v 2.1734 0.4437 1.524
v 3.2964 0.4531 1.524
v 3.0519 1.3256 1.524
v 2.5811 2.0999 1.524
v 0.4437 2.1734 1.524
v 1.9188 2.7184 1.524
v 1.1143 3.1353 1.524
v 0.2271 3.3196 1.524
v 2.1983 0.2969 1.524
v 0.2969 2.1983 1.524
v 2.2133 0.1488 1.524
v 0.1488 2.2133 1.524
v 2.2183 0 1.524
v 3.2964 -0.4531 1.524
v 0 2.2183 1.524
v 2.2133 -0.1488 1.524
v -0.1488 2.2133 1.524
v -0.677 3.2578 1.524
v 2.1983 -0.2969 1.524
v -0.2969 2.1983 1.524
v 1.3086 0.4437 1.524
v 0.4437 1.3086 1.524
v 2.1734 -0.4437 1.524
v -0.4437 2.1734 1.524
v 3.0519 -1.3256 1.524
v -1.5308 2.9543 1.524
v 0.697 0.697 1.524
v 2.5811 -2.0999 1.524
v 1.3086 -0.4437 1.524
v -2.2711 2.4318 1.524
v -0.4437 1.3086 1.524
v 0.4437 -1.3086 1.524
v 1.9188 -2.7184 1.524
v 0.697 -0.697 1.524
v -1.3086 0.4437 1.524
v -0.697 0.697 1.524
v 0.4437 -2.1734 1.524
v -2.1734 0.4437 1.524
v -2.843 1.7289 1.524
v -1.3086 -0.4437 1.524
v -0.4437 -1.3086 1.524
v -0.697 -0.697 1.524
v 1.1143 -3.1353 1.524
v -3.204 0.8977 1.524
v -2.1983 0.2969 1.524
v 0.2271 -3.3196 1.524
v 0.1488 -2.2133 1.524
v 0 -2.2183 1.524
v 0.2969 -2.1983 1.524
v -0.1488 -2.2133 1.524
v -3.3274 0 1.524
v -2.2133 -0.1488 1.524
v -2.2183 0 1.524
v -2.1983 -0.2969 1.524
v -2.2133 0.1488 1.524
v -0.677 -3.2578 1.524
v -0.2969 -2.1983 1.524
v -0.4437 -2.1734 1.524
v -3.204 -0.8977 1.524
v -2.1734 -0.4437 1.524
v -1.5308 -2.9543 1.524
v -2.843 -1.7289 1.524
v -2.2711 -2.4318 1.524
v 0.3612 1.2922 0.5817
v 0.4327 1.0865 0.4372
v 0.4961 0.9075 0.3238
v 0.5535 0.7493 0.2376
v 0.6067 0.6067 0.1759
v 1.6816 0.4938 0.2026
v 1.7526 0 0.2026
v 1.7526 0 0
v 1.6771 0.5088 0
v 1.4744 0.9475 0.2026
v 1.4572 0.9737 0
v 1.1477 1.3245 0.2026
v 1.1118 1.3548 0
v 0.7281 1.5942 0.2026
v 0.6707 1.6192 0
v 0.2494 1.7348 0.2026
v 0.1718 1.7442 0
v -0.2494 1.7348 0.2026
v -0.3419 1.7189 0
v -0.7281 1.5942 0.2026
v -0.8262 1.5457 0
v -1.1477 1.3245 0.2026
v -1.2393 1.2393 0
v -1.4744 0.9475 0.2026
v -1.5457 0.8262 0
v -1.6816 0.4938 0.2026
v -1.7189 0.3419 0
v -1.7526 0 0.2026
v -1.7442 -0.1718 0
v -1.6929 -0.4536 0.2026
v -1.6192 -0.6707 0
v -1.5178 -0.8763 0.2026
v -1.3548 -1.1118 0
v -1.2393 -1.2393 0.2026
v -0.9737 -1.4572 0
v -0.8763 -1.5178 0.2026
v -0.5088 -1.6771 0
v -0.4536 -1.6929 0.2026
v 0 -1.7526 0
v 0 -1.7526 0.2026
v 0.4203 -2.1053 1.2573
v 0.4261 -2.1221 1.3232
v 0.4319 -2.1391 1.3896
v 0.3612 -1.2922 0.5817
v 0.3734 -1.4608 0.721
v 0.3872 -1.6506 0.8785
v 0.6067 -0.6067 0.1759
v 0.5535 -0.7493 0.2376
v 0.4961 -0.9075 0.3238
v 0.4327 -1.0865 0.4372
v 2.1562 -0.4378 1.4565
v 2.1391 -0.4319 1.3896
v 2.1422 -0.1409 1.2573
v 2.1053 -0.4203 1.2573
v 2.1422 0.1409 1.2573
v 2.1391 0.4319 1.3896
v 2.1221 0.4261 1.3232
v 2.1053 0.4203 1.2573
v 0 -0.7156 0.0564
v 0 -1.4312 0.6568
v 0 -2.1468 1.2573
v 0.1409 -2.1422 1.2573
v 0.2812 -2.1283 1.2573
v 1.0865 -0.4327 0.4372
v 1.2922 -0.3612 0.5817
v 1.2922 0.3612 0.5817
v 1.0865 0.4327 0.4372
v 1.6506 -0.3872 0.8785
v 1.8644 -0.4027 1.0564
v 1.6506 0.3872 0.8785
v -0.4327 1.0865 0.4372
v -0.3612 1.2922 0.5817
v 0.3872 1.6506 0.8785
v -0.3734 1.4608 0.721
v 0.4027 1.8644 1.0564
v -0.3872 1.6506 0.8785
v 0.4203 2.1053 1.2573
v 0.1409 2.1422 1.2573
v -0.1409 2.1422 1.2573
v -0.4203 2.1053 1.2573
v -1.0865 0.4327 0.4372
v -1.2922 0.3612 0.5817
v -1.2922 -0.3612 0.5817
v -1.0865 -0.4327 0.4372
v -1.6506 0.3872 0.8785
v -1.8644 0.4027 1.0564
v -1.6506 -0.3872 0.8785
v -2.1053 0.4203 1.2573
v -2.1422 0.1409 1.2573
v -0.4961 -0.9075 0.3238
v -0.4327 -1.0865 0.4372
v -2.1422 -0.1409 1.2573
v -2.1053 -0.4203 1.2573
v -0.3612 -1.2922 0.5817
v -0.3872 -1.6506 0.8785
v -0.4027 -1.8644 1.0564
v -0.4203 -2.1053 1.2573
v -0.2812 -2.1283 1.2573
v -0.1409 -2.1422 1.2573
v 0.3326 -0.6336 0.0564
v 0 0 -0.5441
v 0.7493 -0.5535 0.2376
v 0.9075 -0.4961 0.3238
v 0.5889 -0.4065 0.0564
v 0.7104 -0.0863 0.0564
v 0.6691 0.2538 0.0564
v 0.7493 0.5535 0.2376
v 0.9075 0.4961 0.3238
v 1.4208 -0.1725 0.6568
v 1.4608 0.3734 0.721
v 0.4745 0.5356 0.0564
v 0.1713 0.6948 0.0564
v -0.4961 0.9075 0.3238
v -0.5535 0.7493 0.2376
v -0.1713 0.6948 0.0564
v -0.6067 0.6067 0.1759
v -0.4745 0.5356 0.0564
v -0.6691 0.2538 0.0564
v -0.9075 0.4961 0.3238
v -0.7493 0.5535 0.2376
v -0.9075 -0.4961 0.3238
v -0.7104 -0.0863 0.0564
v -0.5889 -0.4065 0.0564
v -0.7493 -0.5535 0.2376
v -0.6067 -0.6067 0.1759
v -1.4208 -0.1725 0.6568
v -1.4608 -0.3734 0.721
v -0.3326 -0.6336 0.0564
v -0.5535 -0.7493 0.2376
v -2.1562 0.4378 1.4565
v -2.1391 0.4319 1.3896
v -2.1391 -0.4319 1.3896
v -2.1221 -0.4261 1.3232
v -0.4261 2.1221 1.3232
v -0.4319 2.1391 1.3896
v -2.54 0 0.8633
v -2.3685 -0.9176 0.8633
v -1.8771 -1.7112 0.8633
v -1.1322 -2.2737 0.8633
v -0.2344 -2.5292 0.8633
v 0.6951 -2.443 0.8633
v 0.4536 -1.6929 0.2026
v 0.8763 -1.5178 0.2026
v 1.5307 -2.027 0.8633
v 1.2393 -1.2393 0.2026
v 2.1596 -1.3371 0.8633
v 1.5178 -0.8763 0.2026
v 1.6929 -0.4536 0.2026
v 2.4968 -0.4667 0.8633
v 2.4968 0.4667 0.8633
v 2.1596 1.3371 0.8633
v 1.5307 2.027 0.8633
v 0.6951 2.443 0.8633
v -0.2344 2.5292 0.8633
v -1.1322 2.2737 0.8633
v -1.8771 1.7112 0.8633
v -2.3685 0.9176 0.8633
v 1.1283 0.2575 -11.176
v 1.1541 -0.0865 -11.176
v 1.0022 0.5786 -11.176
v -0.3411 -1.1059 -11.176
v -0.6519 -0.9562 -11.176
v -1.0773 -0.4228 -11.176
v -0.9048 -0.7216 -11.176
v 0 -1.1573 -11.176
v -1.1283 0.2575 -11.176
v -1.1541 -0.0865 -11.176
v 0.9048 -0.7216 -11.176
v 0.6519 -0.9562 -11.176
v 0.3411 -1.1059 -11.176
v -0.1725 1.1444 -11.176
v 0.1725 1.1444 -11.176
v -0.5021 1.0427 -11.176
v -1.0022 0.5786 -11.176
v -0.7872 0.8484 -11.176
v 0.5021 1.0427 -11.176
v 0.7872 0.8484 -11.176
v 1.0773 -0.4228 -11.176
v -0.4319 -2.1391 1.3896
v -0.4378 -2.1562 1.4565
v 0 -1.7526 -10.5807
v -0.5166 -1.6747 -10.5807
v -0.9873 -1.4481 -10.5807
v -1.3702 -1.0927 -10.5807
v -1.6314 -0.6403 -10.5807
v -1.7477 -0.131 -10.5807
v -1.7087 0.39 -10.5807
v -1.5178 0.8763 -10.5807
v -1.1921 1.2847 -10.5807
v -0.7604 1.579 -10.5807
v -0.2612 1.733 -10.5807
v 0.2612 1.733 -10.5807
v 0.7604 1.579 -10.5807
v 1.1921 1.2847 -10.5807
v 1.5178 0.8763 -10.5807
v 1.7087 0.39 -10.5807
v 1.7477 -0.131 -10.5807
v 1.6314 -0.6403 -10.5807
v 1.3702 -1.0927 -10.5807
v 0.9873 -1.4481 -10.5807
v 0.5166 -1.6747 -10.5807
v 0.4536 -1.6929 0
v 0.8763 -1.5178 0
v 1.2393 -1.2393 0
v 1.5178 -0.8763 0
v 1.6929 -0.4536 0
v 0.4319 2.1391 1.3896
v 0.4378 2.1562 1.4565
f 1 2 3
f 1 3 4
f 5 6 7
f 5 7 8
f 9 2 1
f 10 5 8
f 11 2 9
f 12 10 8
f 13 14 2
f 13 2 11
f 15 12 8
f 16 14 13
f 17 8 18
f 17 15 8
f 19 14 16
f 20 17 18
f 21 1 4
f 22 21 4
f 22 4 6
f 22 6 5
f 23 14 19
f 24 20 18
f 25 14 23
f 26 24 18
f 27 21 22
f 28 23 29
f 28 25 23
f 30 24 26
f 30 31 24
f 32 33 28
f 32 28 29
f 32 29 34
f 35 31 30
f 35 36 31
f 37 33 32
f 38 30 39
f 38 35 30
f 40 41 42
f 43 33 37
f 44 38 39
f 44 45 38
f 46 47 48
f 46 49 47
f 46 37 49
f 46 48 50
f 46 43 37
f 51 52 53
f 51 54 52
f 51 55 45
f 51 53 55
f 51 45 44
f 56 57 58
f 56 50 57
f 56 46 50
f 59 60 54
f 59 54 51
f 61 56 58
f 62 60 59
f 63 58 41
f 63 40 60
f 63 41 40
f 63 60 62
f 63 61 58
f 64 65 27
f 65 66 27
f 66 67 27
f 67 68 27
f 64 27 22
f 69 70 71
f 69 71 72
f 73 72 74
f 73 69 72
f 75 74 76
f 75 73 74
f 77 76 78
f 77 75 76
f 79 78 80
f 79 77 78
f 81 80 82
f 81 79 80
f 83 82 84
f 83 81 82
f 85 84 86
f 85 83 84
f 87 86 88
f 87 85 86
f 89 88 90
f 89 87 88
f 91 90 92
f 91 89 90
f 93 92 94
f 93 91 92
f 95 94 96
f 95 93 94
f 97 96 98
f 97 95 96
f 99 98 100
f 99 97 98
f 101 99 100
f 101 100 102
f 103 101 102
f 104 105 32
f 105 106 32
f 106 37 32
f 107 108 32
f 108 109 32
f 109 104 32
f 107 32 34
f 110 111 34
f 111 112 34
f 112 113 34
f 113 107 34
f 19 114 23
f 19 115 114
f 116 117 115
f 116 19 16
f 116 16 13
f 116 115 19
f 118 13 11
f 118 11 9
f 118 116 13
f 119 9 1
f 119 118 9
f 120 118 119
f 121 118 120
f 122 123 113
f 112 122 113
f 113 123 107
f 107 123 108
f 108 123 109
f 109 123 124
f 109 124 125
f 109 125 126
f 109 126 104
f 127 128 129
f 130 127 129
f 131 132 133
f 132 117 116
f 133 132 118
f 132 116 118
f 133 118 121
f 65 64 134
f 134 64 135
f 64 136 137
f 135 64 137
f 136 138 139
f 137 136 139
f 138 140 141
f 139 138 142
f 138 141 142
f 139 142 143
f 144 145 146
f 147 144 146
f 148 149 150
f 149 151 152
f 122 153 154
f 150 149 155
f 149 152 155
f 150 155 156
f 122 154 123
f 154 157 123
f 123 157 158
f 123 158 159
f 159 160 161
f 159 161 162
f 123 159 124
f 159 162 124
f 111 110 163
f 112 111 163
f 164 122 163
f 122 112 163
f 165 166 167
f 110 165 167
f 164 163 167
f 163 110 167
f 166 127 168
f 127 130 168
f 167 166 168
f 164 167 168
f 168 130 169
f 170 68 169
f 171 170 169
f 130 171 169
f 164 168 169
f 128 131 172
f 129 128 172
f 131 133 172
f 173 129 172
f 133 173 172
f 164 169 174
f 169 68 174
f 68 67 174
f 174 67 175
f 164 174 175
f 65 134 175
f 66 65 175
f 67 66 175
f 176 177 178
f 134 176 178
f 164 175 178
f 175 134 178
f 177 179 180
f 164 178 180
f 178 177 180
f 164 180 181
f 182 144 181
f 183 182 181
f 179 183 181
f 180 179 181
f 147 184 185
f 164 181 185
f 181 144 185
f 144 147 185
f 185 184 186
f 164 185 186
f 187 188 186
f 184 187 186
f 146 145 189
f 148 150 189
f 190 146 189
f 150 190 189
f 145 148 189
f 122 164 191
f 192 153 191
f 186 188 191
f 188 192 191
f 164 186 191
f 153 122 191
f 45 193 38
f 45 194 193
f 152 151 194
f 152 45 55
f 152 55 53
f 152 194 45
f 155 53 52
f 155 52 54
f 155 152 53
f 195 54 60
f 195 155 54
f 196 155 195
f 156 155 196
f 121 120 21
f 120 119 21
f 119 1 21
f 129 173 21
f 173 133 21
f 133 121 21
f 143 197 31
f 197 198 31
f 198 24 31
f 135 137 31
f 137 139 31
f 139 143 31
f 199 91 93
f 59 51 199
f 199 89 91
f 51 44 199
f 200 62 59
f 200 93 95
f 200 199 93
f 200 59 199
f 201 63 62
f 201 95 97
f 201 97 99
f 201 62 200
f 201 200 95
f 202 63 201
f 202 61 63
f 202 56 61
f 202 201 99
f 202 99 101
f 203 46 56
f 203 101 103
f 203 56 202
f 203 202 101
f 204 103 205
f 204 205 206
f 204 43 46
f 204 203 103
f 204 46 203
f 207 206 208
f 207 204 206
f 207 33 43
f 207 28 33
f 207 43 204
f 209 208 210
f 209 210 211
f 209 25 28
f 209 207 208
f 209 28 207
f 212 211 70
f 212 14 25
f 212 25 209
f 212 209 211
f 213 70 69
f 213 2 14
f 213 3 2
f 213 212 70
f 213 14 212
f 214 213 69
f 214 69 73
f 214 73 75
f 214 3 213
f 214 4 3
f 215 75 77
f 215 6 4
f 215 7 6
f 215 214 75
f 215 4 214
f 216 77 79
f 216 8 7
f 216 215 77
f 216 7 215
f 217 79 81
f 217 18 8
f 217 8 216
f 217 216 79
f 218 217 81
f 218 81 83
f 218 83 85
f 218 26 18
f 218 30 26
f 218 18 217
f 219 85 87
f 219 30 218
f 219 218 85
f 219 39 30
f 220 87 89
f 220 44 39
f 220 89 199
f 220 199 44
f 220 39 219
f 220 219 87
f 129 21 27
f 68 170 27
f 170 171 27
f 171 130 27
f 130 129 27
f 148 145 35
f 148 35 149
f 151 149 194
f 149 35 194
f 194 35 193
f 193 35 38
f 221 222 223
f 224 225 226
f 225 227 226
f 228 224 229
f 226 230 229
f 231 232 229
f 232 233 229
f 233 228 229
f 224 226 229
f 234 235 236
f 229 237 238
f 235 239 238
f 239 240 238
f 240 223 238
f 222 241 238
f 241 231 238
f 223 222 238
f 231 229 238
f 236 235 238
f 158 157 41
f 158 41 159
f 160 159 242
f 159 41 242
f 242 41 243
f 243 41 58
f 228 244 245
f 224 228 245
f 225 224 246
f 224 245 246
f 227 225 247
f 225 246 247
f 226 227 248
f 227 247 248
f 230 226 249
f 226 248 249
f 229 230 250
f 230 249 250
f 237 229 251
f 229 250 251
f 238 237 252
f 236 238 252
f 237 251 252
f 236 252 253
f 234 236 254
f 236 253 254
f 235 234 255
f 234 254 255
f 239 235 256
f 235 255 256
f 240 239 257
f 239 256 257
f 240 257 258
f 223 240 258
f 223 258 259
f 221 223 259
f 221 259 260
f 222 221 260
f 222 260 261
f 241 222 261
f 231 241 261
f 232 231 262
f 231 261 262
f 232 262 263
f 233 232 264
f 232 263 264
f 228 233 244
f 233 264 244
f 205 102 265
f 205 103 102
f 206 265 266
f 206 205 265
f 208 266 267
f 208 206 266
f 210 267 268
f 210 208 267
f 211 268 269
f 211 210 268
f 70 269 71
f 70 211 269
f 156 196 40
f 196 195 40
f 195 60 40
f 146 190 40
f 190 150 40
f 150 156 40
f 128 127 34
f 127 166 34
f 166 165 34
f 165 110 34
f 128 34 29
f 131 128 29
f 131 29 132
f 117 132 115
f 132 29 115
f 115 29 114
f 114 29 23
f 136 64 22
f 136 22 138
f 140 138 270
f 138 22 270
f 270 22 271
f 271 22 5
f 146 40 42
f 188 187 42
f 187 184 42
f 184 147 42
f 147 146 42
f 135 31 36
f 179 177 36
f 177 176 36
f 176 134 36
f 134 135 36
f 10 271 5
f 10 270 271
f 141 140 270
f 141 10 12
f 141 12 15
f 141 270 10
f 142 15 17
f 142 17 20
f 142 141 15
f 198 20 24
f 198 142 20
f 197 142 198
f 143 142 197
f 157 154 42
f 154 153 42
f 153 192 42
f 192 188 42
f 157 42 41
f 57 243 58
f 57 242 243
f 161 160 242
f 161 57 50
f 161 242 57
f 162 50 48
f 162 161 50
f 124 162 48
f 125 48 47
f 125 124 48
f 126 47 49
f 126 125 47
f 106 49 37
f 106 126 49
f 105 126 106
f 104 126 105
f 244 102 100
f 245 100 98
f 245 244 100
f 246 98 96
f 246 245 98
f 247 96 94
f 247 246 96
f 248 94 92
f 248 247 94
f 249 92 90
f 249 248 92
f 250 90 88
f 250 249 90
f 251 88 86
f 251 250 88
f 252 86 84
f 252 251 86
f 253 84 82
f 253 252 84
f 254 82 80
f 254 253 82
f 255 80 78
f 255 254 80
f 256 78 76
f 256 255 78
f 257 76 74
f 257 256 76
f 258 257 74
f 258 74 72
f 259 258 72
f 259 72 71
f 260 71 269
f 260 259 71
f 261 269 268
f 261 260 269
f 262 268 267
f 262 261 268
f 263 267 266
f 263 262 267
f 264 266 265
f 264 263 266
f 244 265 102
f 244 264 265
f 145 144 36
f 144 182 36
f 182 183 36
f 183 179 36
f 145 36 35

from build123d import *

# Parameters (mm, degrees)
SKETCH1_R          = 3.3274
EXTRUDE3_DEPTH     = 1.524
SKETCH4_W          = 12.7
SKETCH4_H          = 1.7526
CHAMFER1_SIZE      = 0.5953125
SKETCH26_R         = 0.8763
EXTRUDE8_DEPTH     = 1.524
CUT_EXTRUDE3_REACH = 15.544
CIRPATTERN1_COUNT  = 4
DRAFT2_ANGLE       = 5


# Read off the part's stored shape, not the designer's step: Extrude10, Draft1
with BuildPart() as part:
    # Sketch1 → Extrude3 (new body)
    with BuildSketch(Plane.XY):
        with Locations(Location((0, 0, 0), (0, 0, 180))):
            Circle(SKETCH1_R)
    extrude(amount=EXTRUDE3_DEPTH)

    # Sketch11 → Cut-Revolve3 (revolve, cut)
    with BuildSketch(Plane(origin=(0, 0, 0), x_dir=(0, 0, -1), z_dir=(1, 0, 0)), mode=Mode.PRIVATE) as cut_revolve3_sk:
        Polygon((0, 1.511167525), (-1.524, 3.3274), (0, 3.3274), align=None)
    revolve(cut_revolve3_sk.sketch.rotate(Axis((0, 0, -0.441444004), (0, 0, 1)), 90), axis=Axis((0, 0, -0.441444004), (0, 0, 1)), mode=Mode.SUBTRACT)

    # Extrude10 outline → Extrude10 (revolve)
    with BuildSketch(Plane.XZ):
        Polygon((1.7526, 0), (1.7526, 0.202585901), (1.511167525, 0.202585901), (1.511167525, 0), (0, 0), (0, -1.7526), align=None)
    revolve(axis=Axis((0, 0, 0), (0, 0, 1)))



with BuildPart() as body_2:
    # Sketch4 → Revolve1 (revolve)
    with BuildSketch(Plane(origin=(0, 0, 0), x_dir=(0, 0, -1), z_dir=(1, 0, 0)), mode=Mode.PRIVATE) as revolve1_sk:
        with Locations((4.826, 0.8763)):
            Rectangle(SKETCH4_W, SKETCH4_H)
    revolve(revolve1_sk.sketch.rotate(Axis((0, 0, 1.524), (0, 0, -1)), 180), axis=Axis((0, 0, 1.524), (0, 0, -1)))

    # Chamfer1
    chamfer1_edges = [body_2.edges().sort_by_distance(p)[0] for p in [
        (0, 1.7526, -11.176),
    ]]
    chamfer(chamfer1_edges, length=CHAMFER1_SIZE)


with BuildPart() as part_1:
    add(part.part)

    add(body_2.part)  # Extrude8 merges body 2
    # Sketch26 → Extrude8 (add)
    with BuildSketch(Plane.XY.offset(1.524)):
        Circle(SKETCH26_R)
    extrude(amount=-EXTRUDE8_DEPTH)

    # Cut-Extrude3: up to this cone (the profile starts inside it)
    cut_extrude3_end = Plane(origin=(0, 0, 1.524), z_dir=(0, 0, 1)).offset(-2.068083744) * Cone(1.192e-06, 24.522394484, 20.576731167, align=(Align.CENTER, Align.CENTER, Align.MIN), mode=Mode.PRIVATE)
    # Sketch12 → Cut-Extrude3 (cut, up to the surface)
    with BuildSketch(Plane.XY.offset(1.524), mode=Mode.PRIVATE) as cut_extrude3_sk1:
        with BuildLine():
            Line((2.173448579, 0.443653333), (1.308550956, 0.443653333))
            Line((1.308550956, 0.443653333), (0.696975982, 0.696975982))
            Line((0.696975982, 0.696975982), (0.443653333, 1.308550956))
            Line((0.443653333, 1.308550956), (0.443653333, 2.173448579))
            ThreePointArc((0.443653333, 2.173448579), (0.22295568, 2.207033704), (0, 2.218266667))
            Line((0, 2.218266667), (0, 0))
            Line((0, 0), (2.218266667, 0))
            ThreePointArc((2.218266667, 0), (2.207033704, 0.22295568), (2.173448579, 0.443653333))
        make_face()
    cut_extrude3_tool1 = extrude(cut_extrude3_sk1.sketch, amount=-CUT_EXTRUDE3_REACH, mode=Mode.PRIVATE) & cut_extrude3_end
    cut_extrude3 = cut_extrude3_tool1.solids().sort_by_distance((1.741, 0.412282, 1.524))[0]
    add(cut_extrude3, mode=Mode.SUBTRACT)

    # CirPattern1: Cut-Extrude3 ×4 about axis
    cirpattern1_axis = Axis((0, 0, 0), (0, 0, 1))
    for i in range(1, CIRPATTERN1_COUNT):
        add(cut_extrude3.rotate(cirpattern1_axis, i * 360 / CIRPATTERN1_COUNT), mode=Mode.SUBTRACT)

    # Draft1 outline → Draft1 (revolve)
    with BuildSketch(Plane.XZ):
        Polygon((2.218266667, 1.524), (2.146804001, 1.257297702), (2.218266667, 1.257297702), align=None)
    revolve(axis=Axis((0, 0, 0), (0, 0, 1)))

    # Draft2
    draft2_faces = [part_1.faces().sort_by_distance(p)[0] for p in [
        (0.443653333, 1.642629798, 1.204938596),
        (0.576807254, 0.987088954, 0.973802508),
        (0.987088954, 0.576807254, 0.973802508),
        (1.642629798, 0.443653333, 1.204938596),
        (1.642629798, -0.443653333, 1.204938596),
        (0.987088954, -0.576807254, 0.973802508),
        (0.576807254, -0.987088954, 0.973802508),
        (0.443653333, -1.642629798, 1.204938596),
        (-0.443653333, -1.642629798, 1.204938596),
        (-0.576807254, -0.987088954, 0.973802508),
        (-0.987088954, -0.576807254, 0.973802508),
        (-1.642629798, -0.443653333, 1.204938596),
        (-1.642629798, 0.443653333, 1.204938596),
        (-0.987088954, 0.576807254, 0.973802508),
        (-0.576807254, 0.987088954, 0.973802508),
        (-0.443653333, 1.642629798, 1.204938596),
    ]]
    draft(draft2_faces, Plane(origin=(0, 1.7526, 1.524), x_dir=(0, 1, 0), z_dir=(0, 0, 1)), DRAFT2_ANGLE)


solid = part_1.part
